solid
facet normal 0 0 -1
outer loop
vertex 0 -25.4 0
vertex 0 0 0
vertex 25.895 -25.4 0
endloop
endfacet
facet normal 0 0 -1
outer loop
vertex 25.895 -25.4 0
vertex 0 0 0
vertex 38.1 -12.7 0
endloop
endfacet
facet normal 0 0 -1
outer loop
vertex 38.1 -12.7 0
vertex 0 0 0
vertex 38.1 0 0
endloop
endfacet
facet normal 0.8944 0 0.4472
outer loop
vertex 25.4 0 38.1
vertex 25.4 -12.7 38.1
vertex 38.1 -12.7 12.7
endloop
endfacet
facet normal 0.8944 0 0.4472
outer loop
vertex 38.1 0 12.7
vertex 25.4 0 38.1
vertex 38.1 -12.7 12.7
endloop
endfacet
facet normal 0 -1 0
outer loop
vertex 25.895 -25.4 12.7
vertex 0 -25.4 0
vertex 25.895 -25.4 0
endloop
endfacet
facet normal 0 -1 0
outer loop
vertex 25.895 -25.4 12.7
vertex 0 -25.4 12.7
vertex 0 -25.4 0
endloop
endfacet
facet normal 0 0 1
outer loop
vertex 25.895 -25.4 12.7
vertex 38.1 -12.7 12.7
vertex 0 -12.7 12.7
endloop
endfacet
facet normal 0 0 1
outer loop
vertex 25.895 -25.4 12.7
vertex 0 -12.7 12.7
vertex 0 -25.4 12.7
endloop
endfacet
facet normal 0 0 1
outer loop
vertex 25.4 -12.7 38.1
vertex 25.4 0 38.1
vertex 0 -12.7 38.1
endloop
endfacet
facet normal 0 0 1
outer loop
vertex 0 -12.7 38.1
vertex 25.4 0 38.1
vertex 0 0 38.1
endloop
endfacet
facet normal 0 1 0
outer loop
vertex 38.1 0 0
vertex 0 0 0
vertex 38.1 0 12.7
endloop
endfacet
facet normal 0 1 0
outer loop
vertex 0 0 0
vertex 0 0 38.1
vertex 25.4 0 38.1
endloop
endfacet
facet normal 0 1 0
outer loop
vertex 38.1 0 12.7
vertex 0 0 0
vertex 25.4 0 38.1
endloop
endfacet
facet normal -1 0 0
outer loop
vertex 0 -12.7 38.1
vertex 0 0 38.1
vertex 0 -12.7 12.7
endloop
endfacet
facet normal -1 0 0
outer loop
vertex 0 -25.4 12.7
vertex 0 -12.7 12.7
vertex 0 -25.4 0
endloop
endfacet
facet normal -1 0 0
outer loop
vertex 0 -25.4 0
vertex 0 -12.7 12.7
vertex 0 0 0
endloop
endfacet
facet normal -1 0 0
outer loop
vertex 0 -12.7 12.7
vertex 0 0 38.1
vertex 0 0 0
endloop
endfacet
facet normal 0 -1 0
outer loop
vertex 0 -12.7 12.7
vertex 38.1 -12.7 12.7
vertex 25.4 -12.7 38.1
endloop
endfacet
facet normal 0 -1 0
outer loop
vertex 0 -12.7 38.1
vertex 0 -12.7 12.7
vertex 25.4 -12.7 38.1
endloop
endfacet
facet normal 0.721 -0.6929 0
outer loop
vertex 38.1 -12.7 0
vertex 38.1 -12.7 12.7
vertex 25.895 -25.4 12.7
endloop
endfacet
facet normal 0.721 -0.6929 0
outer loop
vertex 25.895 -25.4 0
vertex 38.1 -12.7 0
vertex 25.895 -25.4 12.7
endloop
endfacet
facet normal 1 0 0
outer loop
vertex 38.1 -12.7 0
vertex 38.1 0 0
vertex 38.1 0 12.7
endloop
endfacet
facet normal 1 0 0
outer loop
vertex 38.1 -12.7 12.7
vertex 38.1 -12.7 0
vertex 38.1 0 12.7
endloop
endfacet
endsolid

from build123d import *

# Parameters (mm, degrees)
F2_DEPTH = 25.4
F4_DEPTH = 25.4
F5_W     = 12.7
F5_H     = 25.4
F6_DEPTH = 38.1
F8_DEPTH = 25.4


with BuildPart() as f2:
    # F1 (on face) → F2 (new body)
    with BuildSketch(Plane.XZ):
        Polygon((38.1, 38.1), (0, 38.1), (0, 0), (38.1, 0), (38.1, 13.111571), align=None)
    extrude(amount=F2_DEPTH)

    # F3 (on face) → F4 (cut)
    with BuildSketch(Plane.XZ.offset(25.4)):
        Polygon((25.4, 38.1), (38.1, 12.7), (38.1, 38.1), align=None)
    extrude(amount=-F4_DEPTH, mode=Mode.SUBTRACT)

    # F5 (on face) → F6 (cut)
    with BuildSketch(Plane(origin=(0, 0, 0), x_dir=(0, -1, 0), z_dir=(-1, 0, 0))):
        with Locations((19.05, 25.4)):
            Rectangle(F5_W, F5_H)
    extrude(amount=-F6_DEPTH, mode=Mode.SUBTRACT)

    # F7 (on face) → F8 (cut)
    with BuildSketch(Plane.XY.offset(12.7)):
        Polygon((38.1, -25.4), (38.1, -12.7), (25.894709, -25.4), align=None)
    extrude(amount=-F8_DEPTH, mode=Mode.SUBTRACT)


solid = f2.part
